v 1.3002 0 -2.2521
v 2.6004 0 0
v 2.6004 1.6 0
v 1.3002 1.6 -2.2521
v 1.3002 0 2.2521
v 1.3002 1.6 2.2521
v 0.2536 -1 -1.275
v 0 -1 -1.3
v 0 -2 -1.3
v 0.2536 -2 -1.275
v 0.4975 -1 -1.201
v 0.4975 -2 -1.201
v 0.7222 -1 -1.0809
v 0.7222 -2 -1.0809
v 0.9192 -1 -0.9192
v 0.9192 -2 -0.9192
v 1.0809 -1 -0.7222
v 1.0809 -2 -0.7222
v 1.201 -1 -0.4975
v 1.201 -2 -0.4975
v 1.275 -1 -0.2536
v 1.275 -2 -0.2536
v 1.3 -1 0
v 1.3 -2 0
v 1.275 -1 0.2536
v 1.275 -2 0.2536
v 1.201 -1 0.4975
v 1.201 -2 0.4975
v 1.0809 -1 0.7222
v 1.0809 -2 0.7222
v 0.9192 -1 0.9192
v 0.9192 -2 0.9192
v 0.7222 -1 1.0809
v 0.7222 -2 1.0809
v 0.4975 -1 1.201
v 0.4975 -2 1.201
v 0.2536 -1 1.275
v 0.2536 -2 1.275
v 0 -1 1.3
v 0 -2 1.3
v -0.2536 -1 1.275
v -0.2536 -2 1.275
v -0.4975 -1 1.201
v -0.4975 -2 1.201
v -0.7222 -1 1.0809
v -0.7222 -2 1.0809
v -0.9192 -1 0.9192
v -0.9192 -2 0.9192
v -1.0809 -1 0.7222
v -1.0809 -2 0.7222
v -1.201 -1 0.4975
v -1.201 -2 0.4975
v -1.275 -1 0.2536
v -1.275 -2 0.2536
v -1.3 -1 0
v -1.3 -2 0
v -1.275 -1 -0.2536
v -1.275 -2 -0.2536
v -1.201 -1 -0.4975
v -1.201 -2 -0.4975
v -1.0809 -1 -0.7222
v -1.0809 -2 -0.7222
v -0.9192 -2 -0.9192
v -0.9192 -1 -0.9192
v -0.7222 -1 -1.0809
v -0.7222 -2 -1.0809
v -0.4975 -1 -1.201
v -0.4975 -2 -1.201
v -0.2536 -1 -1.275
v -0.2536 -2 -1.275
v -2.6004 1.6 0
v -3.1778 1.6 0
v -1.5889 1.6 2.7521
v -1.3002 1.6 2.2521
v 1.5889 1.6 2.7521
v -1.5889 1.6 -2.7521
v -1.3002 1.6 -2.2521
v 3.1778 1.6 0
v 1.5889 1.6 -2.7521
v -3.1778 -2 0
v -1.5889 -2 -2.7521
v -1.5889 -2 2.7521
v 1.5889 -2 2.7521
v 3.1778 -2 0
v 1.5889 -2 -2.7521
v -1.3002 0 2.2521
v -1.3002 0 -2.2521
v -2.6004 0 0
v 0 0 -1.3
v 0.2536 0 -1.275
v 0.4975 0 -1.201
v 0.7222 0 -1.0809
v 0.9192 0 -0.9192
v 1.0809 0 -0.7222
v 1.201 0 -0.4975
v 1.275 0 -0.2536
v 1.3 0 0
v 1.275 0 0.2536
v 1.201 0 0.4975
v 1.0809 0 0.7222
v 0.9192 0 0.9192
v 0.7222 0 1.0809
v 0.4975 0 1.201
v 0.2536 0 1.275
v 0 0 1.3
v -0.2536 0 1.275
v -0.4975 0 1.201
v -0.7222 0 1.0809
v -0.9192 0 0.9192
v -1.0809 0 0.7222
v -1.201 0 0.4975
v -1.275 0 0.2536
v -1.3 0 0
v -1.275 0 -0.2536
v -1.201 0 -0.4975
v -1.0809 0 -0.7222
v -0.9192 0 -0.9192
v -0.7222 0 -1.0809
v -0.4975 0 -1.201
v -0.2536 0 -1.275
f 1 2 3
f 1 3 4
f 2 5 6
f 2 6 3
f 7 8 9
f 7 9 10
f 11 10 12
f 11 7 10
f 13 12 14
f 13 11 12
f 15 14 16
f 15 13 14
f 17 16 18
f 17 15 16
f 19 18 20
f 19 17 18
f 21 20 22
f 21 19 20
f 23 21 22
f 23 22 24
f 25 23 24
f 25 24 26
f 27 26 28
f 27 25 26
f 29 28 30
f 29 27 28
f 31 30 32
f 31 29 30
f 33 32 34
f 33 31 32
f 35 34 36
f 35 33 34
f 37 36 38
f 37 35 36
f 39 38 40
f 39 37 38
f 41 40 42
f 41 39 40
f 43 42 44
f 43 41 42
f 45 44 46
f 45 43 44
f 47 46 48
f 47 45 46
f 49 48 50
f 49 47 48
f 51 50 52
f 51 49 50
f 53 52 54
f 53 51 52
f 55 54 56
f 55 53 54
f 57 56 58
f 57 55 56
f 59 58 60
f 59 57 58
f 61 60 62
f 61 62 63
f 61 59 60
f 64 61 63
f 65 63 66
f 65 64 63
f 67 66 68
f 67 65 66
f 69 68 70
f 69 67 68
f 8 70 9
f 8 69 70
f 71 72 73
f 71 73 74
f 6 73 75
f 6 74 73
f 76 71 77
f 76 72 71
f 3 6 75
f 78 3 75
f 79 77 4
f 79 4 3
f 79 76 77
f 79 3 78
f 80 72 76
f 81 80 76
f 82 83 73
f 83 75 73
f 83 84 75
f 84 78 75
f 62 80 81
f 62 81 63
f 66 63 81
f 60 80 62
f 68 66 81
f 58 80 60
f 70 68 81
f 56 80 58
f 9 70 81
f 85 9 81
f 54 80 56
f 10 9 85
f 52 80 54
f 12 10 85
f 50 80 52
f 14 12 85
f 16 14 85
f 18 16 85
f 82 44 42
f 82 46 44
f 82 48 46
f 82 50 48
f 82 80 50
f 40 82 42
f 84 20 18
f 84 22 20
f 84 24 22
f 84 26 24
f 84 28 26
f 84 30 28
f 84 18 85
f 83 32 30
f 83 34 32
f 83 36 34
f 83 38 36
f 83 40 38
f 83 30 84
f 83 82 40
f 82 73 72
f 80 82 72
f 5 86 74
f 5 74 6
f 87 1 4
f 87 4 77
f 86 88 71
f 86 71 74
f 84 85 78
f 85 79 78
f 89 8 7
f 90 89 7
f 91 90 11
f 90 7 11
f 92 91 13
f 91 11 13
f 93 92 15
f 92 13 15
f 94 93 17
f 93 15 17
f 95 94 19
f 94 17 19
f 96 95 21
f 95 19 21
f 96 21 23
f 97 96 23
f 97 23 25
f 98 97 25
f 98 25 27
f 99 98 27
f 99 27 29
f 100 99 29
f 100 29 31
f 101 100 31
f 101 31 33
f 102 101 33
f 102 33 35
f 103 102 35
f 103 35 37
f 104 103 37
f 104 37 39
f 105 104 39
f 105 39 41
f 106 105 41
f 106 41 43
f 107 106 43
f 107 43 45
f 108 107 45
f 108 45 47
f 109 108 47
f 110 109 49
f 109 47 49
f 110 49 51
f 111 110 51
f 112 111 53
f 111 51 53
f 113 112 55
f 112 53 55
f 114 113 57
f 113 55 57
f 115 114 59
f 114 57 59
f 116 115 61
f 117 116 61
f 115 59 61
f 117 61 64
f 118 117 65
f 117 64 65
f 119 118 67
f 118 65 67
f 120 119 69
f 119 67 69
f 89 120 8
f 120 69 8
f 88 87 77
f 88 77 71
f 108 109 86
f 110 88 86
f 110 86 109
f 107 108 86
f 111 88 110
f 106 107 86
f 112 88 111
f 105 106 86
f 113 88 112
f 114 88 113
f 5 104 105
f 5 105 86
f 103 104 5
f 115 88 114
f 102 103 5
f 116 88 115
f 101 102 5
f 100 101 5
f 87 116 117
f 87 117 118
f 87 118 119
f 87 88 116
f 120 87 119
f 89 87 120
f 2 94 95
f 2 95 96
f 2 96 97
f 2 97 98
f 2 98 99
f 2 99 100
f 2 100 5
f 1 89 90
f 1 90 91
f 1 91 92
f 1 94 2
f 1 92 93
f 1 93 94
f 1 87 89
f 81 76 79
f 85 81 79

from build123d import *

# Parameters (mm, degrees)
BOSS_EXTRUDE1_DEPTH = 1
BOSS_EXTRUDE2_DEPTH = 1.6
SKETCH2_R           = 1.3
CUT_EXTRUDE1_DEPTH  = 2.6
BOSS_EXTRUDE3_START = 1
SKETCH3_R           = 1.3
BOSS_EXTRUDE3_DEPTH = 1


with BuildPart() as part:
    # Sketch1 → Boss-Extrude1 (new body)
    with BuildSketch(Plane(origin=(0, 0, 0), x_dir=(1, 0, 0), z_dir=(0, 1, 0))):
        Polygon((1.588897275, -2.752050808), (3.177794549, 0), (1.588897275, 2.752050808), (-1.588897275, 2.752050808), (-3.177794549, 0), (-1.588897275, -2.752050808), align=None)
    extrude(amount=-BOSS_EXTRUDE1_DEPTH)

    # Sketch1<3> → Boss-Extrude2 (add)
    with BuildSketch(Plane(origin=(0, 0, 0), x_dir=(1, 0, 0), z_dir=(0, 1, 0))):
        Polygon((1.588897275, -2.752050808), (3.177794549, 0), (1.588897275, 2.752050808), (-1.588897275, 2.752050808), (-3.177794549, 0), (-1.588897275, -2.752050808), align=None)
        Polygon((2.60044428, 0), (1.30022214, -2.252050808), (-1.30022214, -2.252050808), (-2.60044428, 0), (-1.30022214, 2.252050808), (1.30022214, 2.252050808), align=None, mode=Mode.SUBTRACT)
    extrude(amount=BOSS_EXTRUDE2_DEPTH)

    # Sketch2 → Cut-Extrude1 (cut)
    with BuildSketch(Plane.XZ.offset(1)):
        Circle(SKETCH2_R)
    extrude(amount=-CUT_EXTRUDE1_DEPTH, mode=Mode.SUBTRACT)

    # Sketch3 → Boss-Extrude3 (add)
    with BuildSketch(Plane.XZ.offset(1).offset(BOSS_EXTRUDE3_START)):
        Polygon((-1.588897275, -2.752050808), (1.588897275, -2.752050808), (3.177794549, 0), (1.588897275, 2.752050808), (-1.588897275, 2.752050808), (-3.177794549, 0), align=None)
        Circle(SKETCH3_R, mode=Mode.SUBTRACT)
    extrude(amount=-BOSS_EXTRUDE3_DEPTH)


solid = part.part
